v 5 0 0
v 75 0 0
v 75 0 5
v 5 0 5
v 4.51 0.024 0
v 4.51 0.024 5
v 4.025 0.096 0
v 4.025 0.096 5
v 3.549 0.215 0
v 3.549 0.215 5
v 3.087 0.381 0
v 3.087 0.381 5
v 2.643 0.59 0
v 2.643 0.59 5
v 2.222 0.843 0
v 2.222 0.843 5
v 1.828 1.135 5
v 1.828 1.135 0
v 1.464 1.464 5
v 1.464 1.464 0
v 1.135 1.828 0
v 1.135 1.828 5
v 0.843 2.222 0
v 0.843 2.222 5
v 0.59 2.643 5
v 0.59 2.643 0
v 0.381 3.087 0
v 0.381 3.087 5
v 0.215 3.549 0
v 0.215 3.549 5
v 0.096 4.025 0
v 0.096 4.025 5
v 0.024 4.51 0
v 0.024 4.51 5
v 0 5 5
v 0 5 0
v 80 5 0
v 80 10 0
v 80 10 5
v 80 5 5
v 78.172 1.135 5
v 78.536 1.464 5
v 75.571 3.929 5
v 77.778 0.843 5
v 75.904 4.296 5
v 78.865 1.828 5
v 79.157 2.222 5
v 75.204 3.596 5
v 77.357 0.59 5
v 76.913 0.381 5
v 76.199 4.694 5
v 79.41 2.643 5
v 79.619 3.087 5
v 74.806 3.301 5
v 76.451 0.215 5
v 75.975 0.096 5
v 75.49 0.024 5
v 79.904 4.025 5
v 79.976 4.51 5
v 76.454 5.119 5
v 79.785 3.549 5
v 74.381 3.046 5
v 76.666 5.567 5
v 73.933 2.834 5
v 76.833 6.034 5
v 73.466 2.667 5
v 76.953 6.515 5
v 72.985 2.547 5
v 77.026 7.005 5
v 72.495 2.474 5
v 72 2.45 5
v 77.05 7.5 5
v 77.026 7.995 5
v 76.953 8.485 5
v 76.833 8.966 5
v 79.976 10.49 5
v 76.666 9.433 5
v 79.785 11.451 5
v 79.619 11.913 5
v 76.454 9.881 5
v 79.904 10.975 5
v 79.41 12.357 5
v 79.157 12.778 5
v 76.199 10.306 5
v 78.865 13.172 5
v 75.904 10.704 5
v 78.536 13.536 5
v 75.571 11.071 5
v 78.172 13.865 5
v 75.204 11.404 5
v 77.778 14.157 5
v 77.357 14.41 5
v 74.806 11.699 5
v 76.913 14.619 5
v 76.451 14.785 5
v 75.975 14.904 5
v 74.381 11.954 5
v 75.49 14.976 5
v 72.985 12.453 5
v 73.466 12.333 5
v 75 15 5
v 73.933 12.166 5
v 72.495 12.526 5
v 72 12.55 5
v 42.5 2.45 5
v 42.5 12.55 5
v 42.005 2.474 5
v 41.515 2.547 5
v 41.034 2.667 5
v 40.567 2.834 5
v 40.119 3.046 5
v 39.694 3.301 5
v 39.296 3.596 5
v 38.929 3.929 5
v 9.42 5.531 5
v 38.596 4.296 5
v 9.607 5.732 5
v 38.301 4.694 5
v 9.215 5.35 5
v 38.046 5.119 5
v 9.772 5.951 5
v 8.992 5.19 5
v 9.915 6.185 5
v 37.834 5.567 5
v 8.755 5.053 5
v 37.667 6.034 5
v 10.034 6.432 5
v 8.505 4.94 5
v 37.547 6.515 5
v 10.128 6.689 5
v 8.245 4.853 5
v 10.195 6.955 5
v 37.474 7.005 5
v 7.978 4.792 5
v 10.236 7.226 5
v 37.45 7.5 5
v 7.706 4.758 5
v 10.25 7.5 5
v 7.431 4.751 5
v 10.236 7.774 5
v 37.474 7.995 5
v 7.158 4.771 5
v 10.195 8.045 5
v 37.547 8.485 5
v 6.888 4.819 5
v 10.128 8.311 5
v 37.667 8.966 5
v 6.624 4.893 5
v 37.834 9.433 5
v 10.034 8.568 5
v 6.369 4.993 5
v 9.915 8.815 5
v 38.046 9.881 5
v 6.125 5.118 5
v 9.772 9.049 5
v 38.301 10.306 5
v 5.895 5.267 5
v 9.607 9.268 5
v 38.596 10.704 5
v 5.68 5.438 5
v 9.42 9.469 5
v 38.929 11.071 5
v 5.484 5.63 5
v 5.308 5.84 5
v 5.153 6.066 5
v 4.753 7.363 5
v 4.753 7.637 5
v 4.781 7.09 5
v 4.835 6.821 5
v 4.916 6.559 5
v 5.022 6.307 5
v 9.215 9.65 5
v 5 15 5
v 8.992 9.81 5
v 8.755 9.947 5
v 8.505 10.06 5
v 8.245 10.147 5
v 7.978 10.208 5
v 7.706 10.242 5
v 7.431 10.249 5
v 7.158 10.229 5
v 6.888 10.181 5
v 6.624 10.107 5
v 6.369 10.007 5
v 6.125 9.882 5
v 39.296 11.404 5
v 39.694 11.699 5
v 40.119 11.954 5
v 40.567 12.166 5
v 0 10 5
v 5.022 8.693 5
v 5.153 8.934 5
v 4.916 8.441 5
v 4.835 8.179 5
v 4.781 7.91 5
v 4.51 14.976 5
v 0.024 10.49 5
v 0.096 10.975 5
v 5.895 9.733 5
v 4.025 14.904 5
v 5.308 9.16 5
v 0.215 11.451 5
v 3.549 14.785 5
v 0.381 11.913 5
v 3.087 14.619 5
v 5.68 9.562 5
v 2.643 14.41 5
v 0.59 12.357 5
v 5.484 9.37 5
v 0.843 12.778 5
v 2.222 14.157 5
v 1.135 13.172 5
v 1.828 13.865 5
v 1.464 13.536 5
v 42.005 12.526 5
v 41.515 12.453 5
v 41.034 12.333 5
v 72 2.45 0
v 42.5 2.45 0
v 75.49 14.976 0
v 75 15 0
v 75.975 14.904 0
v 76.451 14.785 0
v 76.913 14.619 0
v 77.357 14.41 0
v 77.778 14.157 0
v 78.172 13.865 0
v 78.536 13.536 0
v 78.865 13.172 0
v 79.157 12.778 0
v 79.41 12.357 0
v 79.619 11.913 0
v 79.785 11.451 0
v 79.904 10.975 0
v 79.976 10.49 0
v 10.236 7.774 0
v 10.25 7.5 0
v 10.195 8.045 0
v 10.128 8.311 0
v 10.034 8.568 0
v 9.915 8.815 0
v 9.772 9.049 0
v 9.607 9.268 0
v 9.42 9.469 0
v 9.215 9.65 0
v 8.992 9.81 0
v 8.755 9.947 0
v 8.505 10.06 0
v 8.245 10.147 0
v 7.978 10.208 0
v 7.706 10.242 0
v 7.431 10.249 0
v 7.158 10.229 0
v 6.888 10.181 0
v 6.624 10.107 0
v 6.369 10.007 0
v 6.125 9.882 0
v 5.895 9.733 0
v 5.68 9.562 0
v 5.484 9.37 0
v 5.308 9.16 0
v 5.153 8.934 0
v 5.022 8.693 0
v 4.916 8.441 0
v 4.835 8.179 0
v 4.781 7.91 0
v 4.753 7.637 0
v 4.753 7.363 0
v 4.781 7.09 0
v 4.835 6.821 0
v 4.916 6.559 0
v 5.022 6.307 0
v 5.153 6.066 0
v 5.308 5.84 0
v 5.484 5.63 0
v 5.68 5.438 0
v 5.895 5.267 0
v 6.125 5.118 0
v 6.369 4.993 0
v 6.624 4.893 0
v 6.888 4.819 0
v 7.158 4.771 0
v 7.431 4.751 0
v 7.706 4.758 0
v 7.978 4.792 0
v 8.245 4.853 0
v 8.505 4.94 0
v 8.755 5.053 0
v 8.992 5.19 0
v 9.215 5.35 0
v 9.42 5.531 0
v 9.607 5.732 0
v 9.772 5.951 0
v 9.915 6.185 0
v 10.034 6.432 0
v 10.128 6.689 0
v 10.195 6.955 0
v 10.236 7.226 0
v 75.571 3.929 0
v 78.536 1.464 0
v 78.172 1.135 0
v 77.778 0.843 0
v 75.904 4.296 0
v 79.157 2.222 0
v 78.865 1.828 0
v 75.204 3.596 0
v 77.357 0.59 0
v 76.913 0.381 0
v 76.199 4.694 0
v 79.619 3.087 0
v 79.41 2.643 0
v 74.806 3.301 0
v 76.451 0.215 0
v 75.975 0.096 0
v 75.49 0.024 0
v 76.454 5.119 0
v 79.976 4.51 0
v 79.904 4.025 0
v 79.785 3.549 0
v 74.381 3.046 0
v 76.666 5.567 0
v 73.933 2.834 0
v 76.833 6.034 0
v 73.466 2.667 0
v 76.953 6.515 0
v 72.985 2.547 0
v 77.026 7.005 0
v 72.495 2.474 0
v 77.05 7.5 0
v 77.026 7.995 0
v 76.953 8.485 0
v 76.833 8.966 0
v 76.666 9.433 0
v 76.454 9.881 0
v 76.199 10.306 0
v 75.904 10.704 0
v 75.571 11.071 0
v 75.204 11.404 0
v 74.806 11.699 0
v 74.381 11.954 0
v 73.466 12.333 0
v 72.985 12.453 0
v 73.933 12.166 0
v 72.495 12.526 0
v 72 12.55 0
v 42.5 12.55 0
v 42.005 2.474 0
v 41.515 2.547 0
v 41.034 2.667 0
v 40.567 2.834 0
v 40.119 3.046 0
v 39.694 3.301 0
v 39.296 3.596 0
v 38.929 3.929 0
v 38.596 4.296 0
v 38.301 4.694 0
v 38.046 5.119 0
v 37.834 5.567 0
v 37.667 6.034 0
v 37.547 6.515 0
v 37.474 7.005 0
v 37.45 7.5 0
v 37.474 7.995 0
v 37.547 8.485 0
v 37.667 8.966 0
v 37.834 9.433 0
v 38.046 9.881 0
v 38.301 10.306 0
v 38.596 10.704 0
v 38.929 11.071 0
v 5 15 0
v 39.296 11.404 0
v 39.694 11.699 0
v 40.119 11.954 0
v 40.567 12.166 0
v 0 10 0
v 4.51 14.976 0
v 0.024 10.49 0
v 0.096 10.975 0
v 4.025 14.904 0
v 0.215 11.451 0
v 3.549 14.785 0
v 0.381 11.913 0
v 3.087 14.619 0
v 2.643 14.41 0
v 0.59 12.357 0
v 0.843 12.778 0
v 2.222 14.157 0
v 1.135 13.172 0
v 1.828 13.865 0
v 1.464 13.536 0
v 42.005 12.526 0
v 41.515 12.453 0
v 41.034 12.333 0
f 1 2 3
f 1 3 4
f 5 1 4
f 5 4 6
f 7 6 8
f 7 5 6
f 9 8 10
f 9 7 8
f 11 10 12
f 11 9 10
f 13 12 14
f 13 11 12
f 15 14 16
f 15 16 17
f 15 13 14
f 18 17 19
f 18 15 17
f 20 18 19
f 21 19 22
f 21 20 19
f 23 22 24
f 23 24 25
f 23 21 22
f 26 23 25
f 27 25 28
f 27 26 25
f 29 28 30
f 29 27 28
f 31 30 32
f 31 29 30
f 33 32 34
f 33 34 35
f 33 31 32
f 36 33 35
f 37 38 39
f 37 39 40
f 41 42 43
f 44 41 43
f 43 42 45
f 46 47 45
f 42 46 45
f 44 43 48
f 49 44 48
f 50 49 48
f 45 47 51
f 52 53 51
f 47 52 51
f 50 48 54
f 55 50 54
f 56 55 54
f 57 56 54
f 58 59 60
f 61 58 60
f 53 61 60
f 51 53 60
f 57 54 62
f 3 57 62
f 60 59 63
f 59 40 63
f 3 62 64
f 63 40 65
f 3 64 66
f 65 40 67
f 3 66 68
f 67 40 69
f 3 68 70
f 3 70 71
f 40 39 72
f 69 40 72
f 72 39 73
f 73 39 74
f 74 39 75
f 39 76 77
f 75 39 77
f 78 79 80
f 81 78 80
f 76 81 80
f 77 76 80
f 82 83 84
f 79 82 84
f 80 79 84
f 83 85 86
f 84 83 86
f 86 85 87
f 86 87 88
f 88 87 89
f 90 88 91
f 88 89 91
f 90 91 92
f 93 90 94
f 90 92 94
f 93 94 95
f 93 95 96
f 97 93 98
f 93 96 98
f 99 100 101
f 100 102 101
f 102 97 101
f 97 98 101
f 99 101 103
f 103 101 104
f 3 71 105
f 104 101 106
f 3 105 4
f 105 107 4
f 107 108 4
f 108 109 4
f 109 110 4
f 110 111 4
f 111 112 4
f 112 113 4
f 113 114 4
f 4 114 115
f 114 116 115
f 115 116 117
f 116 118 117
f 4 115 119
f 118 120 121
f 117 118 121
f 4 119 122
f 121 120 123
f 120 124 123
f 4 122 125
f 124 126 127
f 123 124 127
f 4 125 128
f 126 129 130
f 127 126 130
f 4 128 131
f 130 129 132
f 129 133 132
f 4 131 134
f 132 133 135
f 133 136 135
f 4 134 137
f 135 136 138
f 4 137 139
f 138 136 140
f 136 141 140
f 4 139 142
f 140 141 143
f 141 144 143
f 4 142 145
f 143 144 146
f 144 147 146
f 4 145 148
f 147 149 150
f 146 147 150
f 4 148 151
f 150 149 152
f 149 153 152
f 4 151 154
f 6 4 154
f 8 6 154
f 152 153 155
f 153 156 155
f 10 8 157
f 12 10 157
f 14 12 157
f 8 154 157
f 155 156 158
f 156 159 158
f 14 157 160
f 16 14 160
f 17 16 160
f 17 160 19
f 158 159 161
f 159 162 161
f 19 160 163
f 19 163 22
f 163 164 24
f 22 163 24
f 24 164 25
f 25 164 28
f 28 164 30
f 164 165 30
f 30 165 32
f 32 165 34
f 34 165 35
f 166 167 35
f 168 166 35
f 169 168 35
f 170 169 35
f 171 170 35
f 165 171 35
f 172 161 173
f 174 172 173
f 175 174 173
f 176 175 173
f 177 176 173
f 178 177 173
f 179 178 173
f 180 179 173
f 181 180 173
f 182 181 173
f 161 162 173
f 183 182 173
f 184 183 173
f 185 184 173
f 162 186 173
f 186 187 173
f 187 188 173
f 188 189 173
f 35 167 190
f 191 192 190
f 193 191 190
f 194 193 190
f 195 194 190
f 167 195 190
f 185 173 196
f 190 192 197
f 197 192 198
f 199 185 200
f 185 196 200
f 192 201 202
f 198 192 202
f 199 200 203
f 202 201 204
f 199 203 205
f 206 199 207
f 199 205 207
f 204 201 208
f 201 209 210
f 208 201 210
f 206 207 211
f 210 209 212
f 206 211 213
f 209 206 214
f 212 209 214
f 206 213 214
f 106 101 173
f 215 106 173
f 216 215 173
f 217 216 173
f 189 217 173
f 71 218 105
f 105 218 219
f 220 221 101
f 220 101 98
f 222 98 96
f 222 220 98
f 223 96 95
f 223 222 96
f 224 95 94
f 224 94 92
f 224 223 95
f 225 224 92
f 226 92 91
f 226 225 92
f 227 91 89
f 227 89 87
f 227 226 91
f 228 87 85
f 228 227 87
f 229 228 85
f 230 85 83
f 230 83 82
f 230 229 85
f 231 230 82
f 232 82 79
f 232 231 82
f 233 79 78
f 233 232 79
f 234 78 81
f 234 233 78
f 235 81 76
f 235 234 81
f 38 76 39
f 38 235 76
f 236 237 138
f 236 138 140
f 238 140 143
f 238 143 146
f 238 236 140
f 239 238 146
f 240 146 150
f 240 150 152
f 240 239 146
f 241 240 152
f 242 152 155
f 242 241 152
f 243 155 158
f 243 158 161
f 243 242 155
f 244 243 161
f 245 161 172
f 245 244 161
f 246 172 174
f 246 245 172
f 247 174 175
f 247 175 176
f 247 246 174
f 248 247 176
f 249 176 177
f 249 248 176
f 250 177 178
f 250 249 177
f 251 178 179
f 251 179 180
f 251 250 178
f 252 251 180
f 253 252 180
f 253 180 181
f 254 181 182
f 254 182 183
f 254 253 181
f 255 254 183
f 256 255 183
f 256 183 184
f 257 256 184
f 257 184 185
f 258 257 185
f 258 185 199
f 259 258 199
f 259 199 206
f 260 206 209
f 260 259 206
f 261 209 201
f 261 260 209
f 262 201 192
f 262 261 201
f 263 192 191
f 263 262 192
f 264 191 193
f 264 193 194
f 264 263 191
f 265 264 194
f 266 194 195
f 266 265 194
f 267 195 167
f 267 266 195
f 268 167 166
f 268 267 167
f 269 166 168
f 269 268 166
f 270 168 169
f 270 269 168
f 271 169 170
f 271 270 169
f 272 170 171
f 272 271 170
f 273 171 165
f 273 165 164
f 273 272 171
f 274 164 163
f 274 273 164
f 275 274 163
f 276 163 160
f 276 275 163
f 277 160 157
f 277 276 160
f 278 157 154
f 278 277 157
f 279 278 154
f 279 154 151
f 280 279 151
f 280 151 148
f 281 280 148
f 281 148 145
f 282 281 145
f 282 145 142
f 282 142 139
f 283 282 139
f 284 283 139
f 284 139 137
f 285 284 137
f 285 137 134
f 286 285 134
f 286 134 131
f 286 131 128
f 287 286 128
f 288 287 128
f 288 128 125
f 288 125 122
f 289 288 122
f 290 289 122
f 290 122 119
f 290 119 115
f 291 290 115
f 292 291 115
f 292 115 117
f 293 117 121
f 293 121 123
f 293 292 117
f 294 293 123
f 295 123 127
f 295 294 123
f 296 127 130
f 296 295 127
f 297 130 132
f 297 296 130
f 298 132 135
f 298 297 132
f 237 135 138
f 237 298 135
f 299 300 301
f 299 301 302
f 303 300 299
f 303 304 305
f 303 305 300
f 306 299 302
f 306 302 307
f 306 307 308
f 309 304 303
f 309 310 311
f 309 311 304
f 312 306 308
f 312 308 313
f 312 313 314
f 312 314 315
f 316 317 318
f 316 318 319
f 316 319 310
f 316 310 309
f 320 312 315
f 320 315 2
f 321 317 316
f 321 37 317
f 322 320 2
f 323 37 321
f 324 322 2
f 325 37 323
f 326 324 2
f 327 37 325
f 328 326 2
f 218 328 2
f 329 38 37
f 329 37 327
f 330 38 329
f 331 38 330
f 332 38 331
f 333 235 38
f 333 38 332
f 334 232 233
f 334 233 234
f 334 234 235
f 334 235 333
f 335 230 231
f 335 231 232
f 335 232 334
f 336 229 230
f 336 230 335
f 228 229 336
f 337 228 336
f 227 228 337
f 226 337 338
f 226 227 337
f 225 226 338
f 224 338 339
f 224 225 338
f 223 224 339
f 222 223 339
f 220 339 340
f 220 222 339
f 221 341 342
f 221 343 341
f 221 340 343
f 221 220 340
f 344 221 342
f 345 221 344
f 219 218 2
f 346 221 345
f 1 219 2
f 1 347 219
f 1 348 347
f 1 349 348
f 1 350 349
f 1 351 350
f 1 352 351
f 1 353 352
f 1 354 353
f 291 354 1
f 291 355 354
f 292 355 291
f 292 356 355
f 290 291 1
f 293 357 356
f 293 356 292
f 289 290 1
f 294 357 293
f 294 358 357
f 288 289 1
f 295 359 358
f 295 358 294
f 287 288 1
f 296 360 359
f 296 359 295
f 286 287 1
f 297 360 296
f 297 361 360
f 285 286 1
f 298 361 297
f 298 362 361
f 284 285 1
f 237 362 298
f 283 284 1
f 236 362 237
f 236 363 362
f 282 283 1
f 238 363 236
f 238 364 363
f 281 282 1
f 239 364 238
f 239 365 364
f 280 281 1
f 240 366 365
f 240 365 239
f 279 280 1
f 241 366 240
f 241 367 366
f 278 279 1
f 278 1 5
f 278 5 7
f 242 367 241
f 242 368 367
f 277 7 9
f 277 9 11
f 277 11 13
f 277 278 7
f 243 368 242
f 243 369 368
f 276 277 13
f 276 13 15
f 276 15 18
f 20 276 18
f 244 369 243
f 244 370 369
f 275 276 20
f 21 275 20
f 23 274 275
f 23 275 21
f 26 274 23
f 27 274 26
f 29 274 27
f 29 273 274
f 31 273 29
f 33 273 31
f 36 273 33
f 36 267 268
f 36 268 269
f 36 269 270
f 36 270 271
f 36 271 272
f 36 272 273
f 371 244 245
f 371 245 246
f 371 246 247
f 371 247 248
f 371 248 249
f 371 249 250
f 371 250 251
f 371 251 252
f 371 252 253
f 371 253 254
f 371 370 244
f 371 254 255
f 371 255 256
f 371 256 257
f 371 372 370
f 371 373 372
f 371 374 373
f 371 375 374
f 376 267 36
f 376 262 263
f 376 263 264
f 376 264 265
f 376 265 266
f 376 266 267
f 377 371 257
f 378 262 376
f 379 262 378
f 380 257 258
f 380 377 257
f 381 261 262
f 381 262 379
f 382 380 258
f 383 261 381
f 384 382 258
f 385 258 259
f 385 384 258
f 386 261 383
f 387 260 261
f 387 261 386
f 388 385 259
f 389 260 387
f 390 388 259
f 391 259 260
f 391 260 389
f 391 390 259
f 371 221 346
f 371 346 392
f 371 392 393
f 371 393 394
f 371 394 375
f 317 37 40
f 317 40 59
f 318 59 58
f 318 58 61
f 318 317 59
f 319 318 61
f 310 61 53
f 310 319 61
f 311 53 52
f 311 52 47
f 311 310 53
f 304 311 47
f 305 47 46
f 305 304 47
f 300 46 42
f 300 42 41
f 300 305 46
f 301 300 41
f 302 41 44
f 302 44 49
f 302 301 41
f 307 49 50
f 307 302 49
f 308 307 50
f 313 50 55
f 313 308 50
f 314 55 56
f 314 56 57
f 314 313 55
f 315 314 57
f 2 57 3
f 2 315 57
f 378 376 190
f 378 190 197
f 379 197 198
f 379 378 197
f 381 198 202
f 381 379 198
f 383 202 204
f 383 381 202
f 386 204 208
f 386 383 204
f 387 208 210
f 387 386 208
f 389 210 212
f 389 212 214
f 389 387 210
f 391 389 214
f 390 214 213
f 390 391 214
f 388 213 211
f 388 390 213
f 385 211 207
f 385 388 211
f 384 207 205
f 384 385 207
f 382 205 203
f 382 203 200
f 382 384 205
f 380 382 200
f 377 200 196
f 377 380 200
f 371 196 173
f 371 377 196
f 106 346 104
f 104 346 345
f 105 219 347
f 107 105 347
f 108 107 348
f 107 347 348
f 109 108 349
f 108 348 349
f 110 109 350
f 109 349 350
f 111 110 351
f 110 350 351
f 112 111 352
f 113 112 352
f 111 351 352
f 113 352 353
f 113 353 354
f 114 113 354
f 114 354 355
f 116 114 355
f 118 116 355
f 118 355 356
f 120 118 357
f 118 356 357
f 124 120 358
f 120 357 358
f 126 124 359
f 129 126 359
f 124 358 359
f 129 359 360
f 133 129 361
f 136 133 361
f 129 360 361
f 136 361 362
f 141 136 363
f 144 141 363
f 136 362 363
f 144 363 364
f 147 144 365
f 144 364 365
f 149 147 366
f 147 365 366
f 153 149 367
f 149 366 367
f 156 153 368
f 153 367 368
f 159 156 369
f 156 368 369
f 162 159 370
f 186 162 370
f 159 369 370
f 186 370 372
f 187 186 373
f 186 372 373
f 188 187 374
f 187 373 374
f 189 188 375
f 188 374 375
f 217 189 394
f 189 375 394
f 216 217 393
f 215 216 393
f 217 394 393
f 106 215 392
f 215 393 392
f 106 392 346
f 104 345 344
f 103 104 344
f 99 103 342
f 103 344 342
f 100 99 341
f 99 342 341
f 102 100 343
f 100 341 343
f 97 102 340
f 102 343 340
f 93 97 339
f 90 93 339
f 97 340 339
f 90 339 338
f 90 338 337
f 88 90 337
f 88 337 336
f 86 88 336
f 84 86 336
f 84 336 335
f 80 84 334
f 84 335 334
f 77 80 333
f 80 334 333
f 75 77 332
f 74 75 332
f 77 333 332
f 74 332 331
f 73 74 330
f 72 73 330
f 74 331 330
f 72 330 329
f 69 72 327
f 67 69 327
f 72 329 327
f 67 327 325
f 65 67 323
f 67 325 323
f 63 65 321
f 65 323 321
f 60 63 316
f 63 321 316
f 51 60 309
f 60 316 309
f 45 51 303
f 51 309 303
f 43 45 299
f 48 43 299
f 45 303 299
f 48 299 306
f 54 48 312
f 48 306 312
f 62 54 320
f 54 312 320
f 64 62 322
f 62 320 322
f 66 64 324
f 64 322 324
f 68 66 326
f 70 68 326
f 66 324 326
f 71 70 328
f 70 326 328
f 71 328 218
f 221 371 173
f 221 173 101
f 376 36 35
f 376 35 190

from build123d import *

# Parameters (mm, degrees)
SKETCH1_R           = 2.75
BOSS_EXTRUDE1_DEPTH = 5


with BuildPart() as part:
    # Sketch1 → Boss-Extrude1 (new body)
    with BuildSketch(Plane.XY):
        with BuildLine():
            Line((0, 5), (0, 10))
            ThreePointArc((0, 10), (1.464466094, 13.535533906), (5, 15))
            Line((5, 15), (75, 15))
            ThreePointArc((75, 15), (78.535533906, 13.535533906), (80, 10))
            Line((80, 10), (80, 5))
            ThreePointArc((80, 5), (78.535533906, 1.464466094), (75, 0))
            Line((75, 0), (5, 0))
            ThreePointArc((5, 0), (1.464466094, 1.464466094), (0, 5))
        make_face()
        with Locations((7.5, 7.5)):
            Circle(SKETCH1_R, mode=Mode.SUBTRACT)
        with BuildLine():
            Line((42.5, 12.55), (72, 12.55))
            ThreePointArc((72, 12.55), (77.05, 7.5), (72, 2.45))
            Line((72, 2.45), (42.5, 2.45))
            ThreePointArc((42.5, 2.45), (37.45, 7.5), (42.5, 12.55))
        make_face(mode=Mode.SUBTRACT)
    extrude(amount=BOSS_EXTRUDE1_DEPTH)


solid = part.part
